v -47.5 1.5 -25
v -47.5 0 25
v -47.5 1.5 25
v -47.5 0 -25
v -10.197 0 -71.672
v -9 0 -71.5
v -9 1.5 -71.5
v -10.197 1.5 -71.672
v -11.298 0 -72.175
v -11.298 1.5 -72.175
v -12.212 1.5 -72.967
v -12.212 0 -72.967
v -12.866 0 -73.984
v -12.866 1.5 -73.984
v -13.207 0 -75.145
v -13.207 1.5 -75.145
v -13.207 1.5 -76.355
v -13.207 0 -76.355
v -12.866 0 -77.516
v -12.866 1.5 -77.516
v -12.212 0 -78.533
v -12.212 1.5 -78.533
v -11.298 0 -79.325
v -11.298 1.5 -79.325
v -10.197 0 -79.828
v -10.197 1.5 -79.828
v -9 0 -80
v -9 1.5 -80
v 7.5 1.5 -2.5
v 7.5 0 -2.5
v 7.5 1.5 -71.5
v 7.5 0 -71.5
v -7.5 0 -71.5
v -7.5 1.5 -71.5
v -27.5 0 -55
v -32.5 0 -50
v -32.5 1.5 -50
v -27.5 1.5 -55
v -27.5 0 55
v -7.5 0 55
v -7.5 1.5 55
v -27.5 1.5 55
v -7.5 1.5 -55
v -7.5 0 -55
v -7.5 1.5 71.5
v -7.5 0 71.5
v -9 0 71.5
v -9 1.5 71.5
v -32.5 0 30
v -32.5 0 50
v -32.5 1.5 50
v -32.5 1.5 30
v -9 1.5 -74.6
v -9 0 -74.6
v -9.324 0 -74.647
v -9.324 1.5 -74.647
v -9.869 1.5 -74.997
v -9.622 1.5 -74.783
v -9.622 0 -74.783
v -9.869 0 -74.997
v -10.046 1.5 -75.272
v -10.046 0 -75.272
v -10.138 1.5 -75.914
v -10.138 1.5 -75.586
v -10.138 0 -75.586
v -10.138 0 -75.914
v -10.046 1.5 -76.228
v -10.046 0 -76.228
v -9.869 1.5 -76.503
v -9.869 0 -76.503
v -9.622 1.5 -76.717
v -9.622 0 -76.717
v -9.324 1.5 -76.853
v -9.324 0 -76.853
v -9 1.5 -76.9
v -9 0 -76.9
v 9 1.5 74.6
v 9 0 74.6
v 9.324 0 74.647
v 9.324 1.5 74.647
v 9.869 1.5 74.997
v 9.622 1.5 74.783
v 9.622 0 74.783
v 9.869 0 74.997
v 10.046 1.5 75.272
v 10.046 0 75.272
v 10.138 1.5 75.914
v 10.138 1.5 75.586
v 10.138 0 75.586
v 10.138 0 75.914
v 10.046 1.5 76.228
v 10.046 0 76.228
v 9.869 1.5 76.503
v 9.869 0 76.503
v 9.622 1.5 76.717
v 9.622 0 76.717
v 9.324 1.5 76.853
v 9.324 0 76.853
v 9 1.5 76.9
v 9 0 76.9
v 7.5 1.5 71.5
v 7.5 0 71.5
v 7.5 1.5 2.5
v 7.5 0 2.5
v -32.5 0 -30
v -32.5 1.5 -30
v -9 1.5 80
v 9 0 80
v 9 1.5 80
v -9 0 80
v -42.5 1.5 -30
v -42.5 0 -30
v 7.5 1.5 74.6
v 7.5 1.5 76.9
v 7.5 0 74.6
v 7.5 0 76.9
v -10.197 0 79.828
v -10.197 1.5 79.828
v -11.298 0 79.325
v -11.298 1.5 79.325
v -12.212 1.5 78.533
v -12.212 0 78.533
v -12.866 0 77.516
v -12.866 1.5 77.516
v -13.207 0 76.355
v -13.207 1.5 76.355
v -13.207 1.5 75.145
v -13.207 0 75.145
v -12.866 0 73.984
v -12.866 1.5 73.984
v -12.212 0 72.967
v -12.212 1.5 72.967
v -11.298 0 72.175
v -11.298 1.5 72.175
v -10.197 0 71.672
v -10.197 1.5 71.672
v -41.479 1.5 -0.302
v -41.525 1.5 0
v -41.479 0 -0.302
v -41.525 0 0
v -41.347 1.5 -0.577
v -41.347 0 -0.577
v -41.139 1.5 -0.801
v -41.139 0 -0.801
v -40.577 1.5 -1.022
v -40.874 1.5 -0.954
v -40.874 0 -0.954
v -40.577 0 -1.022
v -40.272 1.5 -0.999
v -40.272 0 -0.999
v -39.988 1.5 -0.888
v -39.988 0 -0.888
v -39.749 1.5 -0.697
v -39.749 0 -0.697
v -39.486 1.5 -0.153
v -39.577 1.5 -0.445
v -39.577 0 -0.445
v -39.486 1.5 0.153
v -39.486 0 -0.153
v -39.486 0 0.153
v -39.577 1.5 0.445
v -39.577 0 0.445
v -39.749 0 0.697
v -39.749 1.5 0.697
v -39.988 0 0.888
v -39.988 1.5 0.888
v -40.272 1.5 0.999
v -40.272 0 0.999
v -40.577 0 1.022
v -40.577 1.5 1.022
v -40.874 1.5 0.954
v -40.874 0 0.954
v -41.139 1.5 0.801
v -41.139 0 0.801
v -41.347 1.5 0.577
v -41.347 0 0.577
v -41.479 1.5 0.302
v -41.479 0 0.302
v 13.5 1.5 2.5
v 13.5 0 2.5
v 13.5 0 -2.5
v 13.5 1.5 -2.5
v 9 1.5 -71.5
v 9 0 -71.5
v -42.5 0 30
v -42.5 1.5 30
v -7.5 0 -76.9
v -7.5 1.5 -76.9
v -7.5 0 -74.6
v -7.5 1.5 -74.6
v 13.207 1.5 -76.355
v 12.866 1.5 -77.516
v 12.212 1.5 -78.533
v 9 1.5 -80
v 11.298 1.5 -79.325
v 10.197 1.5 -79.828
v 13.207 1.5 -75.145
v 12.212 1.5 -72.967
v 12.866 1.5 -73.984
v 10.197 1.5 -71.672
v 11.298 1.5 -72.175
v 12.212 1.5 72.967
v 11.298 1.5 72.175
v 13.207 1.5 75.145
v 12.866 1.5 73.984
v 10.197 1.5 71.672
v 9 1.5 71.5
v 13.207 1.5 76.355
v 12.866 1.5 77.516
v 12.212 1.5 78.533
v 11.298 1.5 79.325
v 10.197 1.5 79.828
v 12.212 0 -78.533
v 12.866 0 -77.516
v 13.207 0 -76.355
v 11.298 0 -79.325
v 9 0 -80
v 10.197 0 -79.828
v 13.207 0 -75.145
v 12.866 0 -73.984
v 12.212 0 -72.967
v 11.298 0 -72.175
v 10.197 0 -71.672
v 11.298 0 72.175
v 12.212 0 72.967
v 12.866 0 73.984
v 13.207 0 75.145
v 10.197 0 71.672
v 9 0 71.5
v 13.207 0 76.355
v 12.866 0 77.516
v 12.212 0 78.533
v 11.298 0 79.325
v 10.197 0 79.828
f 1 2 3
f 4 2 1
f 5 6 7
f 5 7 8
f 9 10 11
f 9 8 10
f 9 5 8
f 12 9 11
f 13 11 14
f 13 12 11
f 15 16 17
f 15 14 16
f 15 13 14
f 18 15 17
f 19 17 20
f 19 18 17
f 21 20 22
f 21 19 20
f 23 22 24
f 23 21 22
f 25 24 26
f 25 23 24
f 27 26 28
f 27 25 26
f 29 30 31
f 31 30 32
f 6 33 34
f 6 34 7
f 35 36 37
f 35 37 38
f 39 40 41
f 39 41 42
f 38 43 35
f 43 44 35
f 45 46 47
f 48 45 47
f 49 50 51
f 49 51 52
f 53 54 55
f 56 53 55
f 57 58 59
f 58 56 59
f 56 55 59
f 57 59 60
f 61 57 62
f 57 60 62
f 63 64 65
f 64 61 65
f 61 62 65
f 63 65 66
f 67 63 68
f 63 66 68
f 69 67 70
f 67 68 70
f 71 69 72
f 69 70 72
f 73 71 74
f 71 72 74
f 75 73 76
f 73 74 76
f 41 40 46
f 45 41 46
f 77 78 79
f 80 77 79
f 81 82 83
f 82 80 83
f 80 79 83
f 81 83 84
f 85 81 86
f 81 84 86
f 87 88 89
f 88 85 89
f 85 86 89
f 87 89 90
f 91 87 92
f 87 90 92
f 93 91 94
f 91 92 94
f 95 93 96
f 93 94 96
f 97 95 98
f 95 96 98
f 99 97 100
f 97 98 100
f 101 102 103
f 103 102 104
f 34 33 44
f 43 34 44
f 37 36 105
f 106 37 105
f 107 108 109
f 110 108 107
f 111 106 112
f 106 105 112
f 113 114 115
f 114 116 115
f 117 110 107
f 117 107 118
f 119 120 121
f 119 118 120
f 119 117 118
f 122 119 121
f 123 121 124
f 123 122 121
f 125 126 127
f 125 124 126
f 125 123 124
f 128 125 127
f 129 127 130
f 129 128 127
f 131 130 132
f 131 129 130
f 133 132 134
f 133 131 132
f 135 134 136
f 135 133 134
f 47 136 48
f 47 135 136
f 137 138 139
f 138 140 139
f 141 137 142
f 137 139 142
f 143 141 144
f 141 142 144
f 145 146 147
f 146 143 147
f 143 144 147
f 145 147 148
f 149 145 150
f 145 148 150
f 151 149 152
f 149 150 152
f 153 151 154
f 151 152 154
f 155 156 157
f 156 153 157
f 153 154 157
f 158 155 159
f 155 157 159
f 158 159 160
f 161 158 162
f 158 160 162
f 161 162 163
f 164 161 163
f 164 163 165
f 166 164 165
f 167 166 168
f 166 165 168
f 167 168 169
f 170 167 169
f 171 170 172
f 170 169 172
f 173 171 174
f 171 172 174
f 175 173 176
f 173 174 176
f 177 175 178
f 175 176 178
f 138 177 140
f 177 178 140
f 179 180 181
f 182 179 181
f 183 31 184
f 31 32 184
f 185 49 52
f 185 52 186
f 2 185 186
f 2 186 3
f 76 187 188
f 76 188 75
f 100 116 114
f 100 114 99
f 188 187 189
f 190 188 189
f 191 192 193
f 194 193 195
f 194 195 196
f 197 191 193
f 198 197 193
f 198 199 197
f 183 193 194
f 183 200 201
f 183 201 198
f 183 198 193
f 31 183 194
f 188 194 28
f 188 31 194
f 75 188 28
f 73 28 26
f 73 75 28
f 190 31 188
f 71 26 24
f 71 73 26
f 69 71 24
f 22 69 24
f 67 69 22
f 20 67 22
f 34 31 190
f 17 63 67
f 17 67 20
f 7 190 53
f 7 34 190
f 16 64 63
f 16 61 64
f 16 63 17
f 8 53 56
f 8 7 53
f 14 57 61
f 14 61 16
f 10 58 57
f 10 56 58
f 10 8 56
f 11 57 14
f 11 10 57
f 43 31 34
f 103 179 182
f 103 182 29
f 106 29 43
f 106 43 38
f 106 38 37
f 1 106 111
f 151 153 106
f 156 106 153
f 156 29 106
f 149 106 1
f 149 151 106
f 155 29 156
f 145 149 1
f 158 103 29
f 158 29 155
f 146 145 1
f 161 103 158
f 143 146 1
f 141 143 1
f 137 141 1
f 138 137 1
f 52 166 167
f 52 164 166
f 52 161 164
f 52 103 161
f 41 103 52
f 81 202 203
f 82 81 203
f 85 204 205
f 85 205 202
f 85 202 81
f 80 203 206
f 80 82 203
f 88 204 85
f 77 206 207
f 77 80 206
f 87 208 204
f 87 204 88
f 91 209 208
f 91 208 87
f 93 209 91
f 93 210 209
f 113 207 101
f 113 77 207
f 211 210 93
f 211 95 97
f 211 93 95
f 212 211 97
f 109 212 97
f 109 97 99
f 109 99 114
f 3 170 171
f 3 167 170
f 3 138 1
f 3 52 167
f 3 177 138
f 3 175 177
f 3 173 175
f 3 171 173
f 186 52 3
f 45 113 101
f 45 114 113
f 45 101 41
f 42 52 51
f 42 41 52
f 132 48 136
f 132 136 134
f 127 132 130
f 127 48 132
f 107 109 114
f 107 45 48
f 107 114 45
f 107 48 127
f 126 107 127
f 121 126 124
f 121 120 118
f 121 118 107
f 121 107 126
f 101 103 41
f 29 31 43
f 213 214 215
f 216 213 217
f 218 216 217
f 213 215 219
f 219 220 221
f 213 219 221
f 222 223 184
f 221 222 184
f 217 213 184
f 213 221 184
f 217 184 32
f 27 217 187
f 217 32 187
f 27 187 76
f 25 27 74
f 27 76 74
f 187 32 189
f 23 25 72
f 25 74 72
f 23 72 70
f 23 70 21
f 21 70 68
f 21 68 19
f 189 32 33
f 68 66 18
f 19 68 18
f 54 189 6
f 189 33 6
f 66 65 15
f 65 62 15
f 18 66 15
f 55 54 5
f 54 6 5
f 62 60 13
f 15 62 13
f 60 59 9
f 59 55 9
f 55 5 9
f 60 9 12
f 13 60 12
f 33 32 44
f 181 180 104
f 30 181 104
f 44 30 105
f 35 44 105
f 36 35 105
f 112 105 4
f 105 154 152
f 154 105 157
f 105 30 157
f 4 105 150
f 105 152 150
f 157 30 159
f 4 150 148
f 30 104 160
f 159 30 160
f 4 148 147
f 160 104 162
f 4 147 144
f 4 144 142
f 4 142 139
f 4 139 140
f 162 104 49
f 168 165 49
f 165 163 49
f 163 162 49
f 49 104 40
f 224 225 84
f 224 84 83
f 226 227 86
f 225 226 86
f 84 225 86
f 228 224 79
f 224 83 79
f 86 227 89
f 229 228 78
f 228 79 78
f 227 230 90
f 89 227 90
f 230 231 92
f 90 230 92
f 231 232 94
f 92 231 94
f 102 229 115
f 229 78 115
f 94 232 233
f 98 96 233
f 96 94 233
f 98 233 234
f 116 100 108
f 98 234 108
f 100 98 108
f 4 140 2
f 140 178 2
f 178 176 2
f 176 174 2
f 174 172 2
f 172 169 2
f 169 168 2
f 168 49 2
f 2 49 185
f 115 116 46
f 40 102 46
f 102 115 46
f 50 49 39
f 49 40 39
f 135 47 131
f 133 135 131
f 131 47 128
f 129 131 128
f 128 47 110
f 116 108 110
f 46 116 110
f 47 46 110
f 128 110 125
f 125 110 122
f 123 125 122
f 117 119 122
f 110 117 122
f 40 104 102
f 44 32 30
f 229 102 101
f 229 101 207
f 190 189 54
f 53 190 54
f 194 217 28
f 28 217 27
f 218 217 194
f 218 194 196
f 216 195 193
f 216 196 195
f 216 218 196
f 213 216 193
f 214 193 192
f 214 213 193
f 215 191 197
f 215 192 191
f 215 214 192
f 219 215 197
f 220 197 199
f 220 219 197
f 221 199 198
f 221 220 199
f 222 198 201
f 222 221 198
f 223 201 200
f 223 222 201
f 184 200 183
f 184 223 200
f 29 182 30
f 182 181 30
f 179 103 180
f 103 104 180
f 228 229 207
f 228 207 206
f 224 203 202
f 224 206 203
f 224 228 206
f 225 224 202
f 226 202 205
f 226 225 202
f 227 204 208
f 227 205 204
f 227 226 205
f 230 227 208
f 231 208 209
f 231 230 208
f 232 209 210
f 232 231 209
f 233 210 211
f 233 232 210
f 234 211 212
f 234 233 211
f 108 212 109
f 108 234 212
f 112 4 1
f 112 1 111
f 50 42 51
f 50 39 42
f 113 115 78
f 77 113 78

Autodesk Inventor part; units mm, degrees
ref_plane "YZ Plane" through (0, 0, 0) normal (1, 0, 0) x (0, 1, 0)
ref_plane "XZ Plane" through (0, 0, 0) normal (0, 1, 0) x (-1, 0, 0)
ref_plane "XY Plane" through (0, 0, 0) normal (0, 0, 1) x (1, 0, 0)
sketch "Sketch1" plane through (0, 0, 0) normal (0, 1, 0) x (-1, 0, 0)
  line L0 (7.5, 80) -> (-7.5, 80)
  line L1 (-7.5, -80) -> (7.5, -80)
  line L2 (7.5, 75.75) -> (9, 75.75)
  line L3 (7.5, 80) -> (9, 80)
  line L4 (7.5, 71.5) -> (9, 71.5)
  arc A0 (9, 71.5) -> (9, 80) centre (9, 75.75) ccw
  line L5 (7.5, 74.6) -> (9, 74.6)
  line L6 (7.5, 76.9) -> (9, 76.9)
  arc A1 (9, 74.6) -> (9, 76.9) centre (9, 75.75) ccw
  line L7 (-7.5, 80) -> (-9, 80)
  line L8 (-7.5, 71.5) -> (-9, 71.5)
  arc A2 (-9, 80) -> (-9, 71.5) centre (-9, 75.75) ccw
  line L9 (-7.5, 74.6) -> (-9, 74.6)
  line L10 (-7.5, 76.9) -> (-9, 76.9)
  arc A3 (-9, 76.9) -> (-9, 74.6) centre (-9, 75.75) ccw
  line L11 (7.5, -80) -> (9, -80)
  line L12 (7.5, -71.5) -> (9, -71.5)
  arc A4 (9, -80) -> (9, -71.5) centre (9, -75.75) ccw
  line L13 (7.5, -74.6) -> (9, -74.6)
  line L14 (7.5, -76.9) -> (9, -76.9)
  arc A5 (9, -76.9) -> (9, -74.6) centre (9, -75.75) ccw
  arc A6 (-9, -71.5) -> (-9, -80) centre (-9, -75.75) ccw
  line L15 (-7.5, -71.5) -> (-9, -71.5)
  line L16 (-7.5, -74.6) -> (-9, -74.6)
  arc A7 (-9, -74.6) -> (-9, -76.9) centre (-9, -75.75) ccw
  line L17 (-7.5, -76.9) -> (-9, -76.9)
  line L18 (-7.5, -80) -> (-9, -80)
  line L19 (7.5, 55) -> (27.5, 55)
  line L20 (32.5, 50) -> (32.5, 30)
  line L21 (32.5, 30) -> (42.5, 30)
  line L22 (47.5, 25) -> (47.5, 0)
  line L23 (7.5, -55) -> (27.5, -55)
  line L24 (32.5, -50) -> (32.5, -30)
  line L25 (32.5, -30) -> (42.5, -30)
  line L26 (47.5, -25) -> (47.5, 0)
  line L27 (27.5, 55) -> (32.5, 50)
  line L28 (42.5, 30) -> (47.5, 25)
  line L29 (47.5, -25) -> (42.5, -30)
  line L30 (32.5, -50) -> (27.5, -55)
  circle A8 centre (40.5, 0) radius 1.025
  circle A9 centre (-11.5, 0) radius 1.025
  line L31 (-7.5, 2.5) -> (-13.5, 2.5)
  line L32 (-13.5, 2.5) -> (-13.5, -2.5)
  line L33 (-13.5, -2.5) -> (-7.5, -2.5)
  line L34 (-12.525, 0) -> (-13.5, 0) construction
  line L35 (7.5, 55) -> (7.5, 71.5)
  line L36 (7.5, 74.6) -> (7.5, 76.9)
  line L37 (-7.5, 76.9) -> (-7.5, 74.6)
  line L38 (-7.5, 71.5) -> (-7.5, 2.5)
  line L39 (7.5, -76.9) -> (7.5, -74.6)
  line L40 (7.5, -71.5) -> (7.5, -55)
  line L41 (-7.5, -2.5) -> (-7.5, -71.5)
  line L42 (-7.5, -74.6) -> (-7.5, -76.9)
  point P0 (8.25, 71.5)
  point P1 (32.5, 55)
  point P2 (47.5, 30)
  point P3 (32.5, -55)
  point P4 (47.5, -30)
  dimension "d26" = 2.05
  dimension "d0" = 160
  dimension "d2" = 1.5
  dimension "d3" = 4.25
  dimension "d5" = 4.25
  dimension "d6" = 4.25
  dimension "d7" = 1.15
  dimension "d8" = 1.15
  dimension "d9" = 1.15
  dimension "d10" = 25
  dimension "d11" = 25
  dimension "d12" = 15
  dimension "d13" = 25
  dimension "d14" = 25
  dimension "d15" = 5
  dimension "d16" = 5
  dimension "d17" = 5
  dimension "d18" = 5
  dimension "d19" = 5
  dimension "d20" = 5
  dimension "d21" = 5
  dimension "d22" = 5
  dimension "d24" = 2.05
  dimension "d25" = 7
extrude "Extrusion1" add sketch "Sketch1" along normal blind 1.5 contours L3 A0 L4 L35 L19 L27 L20 L21 L28 L22 L26 L29 L25 L24 L30 L23 L40 L12 A4 L11 L1 L18 A6 L15 L41 L33 L32 L31 L38 L8 A2 L7 L0 | L36 L6 A1 L5 | L42 L17 A7 L16 | A9
equation "\"d16\" = d15"
equation "\"d17\" = d15"
equation "\"d18\" = d17"
equation "\"d19\" = d15"
equation "\"d20\" = d19"
equation "\"d21\" = d15"
equation "\"d22\" = d21"
properties part number "linefollower_chassy_model_3"
